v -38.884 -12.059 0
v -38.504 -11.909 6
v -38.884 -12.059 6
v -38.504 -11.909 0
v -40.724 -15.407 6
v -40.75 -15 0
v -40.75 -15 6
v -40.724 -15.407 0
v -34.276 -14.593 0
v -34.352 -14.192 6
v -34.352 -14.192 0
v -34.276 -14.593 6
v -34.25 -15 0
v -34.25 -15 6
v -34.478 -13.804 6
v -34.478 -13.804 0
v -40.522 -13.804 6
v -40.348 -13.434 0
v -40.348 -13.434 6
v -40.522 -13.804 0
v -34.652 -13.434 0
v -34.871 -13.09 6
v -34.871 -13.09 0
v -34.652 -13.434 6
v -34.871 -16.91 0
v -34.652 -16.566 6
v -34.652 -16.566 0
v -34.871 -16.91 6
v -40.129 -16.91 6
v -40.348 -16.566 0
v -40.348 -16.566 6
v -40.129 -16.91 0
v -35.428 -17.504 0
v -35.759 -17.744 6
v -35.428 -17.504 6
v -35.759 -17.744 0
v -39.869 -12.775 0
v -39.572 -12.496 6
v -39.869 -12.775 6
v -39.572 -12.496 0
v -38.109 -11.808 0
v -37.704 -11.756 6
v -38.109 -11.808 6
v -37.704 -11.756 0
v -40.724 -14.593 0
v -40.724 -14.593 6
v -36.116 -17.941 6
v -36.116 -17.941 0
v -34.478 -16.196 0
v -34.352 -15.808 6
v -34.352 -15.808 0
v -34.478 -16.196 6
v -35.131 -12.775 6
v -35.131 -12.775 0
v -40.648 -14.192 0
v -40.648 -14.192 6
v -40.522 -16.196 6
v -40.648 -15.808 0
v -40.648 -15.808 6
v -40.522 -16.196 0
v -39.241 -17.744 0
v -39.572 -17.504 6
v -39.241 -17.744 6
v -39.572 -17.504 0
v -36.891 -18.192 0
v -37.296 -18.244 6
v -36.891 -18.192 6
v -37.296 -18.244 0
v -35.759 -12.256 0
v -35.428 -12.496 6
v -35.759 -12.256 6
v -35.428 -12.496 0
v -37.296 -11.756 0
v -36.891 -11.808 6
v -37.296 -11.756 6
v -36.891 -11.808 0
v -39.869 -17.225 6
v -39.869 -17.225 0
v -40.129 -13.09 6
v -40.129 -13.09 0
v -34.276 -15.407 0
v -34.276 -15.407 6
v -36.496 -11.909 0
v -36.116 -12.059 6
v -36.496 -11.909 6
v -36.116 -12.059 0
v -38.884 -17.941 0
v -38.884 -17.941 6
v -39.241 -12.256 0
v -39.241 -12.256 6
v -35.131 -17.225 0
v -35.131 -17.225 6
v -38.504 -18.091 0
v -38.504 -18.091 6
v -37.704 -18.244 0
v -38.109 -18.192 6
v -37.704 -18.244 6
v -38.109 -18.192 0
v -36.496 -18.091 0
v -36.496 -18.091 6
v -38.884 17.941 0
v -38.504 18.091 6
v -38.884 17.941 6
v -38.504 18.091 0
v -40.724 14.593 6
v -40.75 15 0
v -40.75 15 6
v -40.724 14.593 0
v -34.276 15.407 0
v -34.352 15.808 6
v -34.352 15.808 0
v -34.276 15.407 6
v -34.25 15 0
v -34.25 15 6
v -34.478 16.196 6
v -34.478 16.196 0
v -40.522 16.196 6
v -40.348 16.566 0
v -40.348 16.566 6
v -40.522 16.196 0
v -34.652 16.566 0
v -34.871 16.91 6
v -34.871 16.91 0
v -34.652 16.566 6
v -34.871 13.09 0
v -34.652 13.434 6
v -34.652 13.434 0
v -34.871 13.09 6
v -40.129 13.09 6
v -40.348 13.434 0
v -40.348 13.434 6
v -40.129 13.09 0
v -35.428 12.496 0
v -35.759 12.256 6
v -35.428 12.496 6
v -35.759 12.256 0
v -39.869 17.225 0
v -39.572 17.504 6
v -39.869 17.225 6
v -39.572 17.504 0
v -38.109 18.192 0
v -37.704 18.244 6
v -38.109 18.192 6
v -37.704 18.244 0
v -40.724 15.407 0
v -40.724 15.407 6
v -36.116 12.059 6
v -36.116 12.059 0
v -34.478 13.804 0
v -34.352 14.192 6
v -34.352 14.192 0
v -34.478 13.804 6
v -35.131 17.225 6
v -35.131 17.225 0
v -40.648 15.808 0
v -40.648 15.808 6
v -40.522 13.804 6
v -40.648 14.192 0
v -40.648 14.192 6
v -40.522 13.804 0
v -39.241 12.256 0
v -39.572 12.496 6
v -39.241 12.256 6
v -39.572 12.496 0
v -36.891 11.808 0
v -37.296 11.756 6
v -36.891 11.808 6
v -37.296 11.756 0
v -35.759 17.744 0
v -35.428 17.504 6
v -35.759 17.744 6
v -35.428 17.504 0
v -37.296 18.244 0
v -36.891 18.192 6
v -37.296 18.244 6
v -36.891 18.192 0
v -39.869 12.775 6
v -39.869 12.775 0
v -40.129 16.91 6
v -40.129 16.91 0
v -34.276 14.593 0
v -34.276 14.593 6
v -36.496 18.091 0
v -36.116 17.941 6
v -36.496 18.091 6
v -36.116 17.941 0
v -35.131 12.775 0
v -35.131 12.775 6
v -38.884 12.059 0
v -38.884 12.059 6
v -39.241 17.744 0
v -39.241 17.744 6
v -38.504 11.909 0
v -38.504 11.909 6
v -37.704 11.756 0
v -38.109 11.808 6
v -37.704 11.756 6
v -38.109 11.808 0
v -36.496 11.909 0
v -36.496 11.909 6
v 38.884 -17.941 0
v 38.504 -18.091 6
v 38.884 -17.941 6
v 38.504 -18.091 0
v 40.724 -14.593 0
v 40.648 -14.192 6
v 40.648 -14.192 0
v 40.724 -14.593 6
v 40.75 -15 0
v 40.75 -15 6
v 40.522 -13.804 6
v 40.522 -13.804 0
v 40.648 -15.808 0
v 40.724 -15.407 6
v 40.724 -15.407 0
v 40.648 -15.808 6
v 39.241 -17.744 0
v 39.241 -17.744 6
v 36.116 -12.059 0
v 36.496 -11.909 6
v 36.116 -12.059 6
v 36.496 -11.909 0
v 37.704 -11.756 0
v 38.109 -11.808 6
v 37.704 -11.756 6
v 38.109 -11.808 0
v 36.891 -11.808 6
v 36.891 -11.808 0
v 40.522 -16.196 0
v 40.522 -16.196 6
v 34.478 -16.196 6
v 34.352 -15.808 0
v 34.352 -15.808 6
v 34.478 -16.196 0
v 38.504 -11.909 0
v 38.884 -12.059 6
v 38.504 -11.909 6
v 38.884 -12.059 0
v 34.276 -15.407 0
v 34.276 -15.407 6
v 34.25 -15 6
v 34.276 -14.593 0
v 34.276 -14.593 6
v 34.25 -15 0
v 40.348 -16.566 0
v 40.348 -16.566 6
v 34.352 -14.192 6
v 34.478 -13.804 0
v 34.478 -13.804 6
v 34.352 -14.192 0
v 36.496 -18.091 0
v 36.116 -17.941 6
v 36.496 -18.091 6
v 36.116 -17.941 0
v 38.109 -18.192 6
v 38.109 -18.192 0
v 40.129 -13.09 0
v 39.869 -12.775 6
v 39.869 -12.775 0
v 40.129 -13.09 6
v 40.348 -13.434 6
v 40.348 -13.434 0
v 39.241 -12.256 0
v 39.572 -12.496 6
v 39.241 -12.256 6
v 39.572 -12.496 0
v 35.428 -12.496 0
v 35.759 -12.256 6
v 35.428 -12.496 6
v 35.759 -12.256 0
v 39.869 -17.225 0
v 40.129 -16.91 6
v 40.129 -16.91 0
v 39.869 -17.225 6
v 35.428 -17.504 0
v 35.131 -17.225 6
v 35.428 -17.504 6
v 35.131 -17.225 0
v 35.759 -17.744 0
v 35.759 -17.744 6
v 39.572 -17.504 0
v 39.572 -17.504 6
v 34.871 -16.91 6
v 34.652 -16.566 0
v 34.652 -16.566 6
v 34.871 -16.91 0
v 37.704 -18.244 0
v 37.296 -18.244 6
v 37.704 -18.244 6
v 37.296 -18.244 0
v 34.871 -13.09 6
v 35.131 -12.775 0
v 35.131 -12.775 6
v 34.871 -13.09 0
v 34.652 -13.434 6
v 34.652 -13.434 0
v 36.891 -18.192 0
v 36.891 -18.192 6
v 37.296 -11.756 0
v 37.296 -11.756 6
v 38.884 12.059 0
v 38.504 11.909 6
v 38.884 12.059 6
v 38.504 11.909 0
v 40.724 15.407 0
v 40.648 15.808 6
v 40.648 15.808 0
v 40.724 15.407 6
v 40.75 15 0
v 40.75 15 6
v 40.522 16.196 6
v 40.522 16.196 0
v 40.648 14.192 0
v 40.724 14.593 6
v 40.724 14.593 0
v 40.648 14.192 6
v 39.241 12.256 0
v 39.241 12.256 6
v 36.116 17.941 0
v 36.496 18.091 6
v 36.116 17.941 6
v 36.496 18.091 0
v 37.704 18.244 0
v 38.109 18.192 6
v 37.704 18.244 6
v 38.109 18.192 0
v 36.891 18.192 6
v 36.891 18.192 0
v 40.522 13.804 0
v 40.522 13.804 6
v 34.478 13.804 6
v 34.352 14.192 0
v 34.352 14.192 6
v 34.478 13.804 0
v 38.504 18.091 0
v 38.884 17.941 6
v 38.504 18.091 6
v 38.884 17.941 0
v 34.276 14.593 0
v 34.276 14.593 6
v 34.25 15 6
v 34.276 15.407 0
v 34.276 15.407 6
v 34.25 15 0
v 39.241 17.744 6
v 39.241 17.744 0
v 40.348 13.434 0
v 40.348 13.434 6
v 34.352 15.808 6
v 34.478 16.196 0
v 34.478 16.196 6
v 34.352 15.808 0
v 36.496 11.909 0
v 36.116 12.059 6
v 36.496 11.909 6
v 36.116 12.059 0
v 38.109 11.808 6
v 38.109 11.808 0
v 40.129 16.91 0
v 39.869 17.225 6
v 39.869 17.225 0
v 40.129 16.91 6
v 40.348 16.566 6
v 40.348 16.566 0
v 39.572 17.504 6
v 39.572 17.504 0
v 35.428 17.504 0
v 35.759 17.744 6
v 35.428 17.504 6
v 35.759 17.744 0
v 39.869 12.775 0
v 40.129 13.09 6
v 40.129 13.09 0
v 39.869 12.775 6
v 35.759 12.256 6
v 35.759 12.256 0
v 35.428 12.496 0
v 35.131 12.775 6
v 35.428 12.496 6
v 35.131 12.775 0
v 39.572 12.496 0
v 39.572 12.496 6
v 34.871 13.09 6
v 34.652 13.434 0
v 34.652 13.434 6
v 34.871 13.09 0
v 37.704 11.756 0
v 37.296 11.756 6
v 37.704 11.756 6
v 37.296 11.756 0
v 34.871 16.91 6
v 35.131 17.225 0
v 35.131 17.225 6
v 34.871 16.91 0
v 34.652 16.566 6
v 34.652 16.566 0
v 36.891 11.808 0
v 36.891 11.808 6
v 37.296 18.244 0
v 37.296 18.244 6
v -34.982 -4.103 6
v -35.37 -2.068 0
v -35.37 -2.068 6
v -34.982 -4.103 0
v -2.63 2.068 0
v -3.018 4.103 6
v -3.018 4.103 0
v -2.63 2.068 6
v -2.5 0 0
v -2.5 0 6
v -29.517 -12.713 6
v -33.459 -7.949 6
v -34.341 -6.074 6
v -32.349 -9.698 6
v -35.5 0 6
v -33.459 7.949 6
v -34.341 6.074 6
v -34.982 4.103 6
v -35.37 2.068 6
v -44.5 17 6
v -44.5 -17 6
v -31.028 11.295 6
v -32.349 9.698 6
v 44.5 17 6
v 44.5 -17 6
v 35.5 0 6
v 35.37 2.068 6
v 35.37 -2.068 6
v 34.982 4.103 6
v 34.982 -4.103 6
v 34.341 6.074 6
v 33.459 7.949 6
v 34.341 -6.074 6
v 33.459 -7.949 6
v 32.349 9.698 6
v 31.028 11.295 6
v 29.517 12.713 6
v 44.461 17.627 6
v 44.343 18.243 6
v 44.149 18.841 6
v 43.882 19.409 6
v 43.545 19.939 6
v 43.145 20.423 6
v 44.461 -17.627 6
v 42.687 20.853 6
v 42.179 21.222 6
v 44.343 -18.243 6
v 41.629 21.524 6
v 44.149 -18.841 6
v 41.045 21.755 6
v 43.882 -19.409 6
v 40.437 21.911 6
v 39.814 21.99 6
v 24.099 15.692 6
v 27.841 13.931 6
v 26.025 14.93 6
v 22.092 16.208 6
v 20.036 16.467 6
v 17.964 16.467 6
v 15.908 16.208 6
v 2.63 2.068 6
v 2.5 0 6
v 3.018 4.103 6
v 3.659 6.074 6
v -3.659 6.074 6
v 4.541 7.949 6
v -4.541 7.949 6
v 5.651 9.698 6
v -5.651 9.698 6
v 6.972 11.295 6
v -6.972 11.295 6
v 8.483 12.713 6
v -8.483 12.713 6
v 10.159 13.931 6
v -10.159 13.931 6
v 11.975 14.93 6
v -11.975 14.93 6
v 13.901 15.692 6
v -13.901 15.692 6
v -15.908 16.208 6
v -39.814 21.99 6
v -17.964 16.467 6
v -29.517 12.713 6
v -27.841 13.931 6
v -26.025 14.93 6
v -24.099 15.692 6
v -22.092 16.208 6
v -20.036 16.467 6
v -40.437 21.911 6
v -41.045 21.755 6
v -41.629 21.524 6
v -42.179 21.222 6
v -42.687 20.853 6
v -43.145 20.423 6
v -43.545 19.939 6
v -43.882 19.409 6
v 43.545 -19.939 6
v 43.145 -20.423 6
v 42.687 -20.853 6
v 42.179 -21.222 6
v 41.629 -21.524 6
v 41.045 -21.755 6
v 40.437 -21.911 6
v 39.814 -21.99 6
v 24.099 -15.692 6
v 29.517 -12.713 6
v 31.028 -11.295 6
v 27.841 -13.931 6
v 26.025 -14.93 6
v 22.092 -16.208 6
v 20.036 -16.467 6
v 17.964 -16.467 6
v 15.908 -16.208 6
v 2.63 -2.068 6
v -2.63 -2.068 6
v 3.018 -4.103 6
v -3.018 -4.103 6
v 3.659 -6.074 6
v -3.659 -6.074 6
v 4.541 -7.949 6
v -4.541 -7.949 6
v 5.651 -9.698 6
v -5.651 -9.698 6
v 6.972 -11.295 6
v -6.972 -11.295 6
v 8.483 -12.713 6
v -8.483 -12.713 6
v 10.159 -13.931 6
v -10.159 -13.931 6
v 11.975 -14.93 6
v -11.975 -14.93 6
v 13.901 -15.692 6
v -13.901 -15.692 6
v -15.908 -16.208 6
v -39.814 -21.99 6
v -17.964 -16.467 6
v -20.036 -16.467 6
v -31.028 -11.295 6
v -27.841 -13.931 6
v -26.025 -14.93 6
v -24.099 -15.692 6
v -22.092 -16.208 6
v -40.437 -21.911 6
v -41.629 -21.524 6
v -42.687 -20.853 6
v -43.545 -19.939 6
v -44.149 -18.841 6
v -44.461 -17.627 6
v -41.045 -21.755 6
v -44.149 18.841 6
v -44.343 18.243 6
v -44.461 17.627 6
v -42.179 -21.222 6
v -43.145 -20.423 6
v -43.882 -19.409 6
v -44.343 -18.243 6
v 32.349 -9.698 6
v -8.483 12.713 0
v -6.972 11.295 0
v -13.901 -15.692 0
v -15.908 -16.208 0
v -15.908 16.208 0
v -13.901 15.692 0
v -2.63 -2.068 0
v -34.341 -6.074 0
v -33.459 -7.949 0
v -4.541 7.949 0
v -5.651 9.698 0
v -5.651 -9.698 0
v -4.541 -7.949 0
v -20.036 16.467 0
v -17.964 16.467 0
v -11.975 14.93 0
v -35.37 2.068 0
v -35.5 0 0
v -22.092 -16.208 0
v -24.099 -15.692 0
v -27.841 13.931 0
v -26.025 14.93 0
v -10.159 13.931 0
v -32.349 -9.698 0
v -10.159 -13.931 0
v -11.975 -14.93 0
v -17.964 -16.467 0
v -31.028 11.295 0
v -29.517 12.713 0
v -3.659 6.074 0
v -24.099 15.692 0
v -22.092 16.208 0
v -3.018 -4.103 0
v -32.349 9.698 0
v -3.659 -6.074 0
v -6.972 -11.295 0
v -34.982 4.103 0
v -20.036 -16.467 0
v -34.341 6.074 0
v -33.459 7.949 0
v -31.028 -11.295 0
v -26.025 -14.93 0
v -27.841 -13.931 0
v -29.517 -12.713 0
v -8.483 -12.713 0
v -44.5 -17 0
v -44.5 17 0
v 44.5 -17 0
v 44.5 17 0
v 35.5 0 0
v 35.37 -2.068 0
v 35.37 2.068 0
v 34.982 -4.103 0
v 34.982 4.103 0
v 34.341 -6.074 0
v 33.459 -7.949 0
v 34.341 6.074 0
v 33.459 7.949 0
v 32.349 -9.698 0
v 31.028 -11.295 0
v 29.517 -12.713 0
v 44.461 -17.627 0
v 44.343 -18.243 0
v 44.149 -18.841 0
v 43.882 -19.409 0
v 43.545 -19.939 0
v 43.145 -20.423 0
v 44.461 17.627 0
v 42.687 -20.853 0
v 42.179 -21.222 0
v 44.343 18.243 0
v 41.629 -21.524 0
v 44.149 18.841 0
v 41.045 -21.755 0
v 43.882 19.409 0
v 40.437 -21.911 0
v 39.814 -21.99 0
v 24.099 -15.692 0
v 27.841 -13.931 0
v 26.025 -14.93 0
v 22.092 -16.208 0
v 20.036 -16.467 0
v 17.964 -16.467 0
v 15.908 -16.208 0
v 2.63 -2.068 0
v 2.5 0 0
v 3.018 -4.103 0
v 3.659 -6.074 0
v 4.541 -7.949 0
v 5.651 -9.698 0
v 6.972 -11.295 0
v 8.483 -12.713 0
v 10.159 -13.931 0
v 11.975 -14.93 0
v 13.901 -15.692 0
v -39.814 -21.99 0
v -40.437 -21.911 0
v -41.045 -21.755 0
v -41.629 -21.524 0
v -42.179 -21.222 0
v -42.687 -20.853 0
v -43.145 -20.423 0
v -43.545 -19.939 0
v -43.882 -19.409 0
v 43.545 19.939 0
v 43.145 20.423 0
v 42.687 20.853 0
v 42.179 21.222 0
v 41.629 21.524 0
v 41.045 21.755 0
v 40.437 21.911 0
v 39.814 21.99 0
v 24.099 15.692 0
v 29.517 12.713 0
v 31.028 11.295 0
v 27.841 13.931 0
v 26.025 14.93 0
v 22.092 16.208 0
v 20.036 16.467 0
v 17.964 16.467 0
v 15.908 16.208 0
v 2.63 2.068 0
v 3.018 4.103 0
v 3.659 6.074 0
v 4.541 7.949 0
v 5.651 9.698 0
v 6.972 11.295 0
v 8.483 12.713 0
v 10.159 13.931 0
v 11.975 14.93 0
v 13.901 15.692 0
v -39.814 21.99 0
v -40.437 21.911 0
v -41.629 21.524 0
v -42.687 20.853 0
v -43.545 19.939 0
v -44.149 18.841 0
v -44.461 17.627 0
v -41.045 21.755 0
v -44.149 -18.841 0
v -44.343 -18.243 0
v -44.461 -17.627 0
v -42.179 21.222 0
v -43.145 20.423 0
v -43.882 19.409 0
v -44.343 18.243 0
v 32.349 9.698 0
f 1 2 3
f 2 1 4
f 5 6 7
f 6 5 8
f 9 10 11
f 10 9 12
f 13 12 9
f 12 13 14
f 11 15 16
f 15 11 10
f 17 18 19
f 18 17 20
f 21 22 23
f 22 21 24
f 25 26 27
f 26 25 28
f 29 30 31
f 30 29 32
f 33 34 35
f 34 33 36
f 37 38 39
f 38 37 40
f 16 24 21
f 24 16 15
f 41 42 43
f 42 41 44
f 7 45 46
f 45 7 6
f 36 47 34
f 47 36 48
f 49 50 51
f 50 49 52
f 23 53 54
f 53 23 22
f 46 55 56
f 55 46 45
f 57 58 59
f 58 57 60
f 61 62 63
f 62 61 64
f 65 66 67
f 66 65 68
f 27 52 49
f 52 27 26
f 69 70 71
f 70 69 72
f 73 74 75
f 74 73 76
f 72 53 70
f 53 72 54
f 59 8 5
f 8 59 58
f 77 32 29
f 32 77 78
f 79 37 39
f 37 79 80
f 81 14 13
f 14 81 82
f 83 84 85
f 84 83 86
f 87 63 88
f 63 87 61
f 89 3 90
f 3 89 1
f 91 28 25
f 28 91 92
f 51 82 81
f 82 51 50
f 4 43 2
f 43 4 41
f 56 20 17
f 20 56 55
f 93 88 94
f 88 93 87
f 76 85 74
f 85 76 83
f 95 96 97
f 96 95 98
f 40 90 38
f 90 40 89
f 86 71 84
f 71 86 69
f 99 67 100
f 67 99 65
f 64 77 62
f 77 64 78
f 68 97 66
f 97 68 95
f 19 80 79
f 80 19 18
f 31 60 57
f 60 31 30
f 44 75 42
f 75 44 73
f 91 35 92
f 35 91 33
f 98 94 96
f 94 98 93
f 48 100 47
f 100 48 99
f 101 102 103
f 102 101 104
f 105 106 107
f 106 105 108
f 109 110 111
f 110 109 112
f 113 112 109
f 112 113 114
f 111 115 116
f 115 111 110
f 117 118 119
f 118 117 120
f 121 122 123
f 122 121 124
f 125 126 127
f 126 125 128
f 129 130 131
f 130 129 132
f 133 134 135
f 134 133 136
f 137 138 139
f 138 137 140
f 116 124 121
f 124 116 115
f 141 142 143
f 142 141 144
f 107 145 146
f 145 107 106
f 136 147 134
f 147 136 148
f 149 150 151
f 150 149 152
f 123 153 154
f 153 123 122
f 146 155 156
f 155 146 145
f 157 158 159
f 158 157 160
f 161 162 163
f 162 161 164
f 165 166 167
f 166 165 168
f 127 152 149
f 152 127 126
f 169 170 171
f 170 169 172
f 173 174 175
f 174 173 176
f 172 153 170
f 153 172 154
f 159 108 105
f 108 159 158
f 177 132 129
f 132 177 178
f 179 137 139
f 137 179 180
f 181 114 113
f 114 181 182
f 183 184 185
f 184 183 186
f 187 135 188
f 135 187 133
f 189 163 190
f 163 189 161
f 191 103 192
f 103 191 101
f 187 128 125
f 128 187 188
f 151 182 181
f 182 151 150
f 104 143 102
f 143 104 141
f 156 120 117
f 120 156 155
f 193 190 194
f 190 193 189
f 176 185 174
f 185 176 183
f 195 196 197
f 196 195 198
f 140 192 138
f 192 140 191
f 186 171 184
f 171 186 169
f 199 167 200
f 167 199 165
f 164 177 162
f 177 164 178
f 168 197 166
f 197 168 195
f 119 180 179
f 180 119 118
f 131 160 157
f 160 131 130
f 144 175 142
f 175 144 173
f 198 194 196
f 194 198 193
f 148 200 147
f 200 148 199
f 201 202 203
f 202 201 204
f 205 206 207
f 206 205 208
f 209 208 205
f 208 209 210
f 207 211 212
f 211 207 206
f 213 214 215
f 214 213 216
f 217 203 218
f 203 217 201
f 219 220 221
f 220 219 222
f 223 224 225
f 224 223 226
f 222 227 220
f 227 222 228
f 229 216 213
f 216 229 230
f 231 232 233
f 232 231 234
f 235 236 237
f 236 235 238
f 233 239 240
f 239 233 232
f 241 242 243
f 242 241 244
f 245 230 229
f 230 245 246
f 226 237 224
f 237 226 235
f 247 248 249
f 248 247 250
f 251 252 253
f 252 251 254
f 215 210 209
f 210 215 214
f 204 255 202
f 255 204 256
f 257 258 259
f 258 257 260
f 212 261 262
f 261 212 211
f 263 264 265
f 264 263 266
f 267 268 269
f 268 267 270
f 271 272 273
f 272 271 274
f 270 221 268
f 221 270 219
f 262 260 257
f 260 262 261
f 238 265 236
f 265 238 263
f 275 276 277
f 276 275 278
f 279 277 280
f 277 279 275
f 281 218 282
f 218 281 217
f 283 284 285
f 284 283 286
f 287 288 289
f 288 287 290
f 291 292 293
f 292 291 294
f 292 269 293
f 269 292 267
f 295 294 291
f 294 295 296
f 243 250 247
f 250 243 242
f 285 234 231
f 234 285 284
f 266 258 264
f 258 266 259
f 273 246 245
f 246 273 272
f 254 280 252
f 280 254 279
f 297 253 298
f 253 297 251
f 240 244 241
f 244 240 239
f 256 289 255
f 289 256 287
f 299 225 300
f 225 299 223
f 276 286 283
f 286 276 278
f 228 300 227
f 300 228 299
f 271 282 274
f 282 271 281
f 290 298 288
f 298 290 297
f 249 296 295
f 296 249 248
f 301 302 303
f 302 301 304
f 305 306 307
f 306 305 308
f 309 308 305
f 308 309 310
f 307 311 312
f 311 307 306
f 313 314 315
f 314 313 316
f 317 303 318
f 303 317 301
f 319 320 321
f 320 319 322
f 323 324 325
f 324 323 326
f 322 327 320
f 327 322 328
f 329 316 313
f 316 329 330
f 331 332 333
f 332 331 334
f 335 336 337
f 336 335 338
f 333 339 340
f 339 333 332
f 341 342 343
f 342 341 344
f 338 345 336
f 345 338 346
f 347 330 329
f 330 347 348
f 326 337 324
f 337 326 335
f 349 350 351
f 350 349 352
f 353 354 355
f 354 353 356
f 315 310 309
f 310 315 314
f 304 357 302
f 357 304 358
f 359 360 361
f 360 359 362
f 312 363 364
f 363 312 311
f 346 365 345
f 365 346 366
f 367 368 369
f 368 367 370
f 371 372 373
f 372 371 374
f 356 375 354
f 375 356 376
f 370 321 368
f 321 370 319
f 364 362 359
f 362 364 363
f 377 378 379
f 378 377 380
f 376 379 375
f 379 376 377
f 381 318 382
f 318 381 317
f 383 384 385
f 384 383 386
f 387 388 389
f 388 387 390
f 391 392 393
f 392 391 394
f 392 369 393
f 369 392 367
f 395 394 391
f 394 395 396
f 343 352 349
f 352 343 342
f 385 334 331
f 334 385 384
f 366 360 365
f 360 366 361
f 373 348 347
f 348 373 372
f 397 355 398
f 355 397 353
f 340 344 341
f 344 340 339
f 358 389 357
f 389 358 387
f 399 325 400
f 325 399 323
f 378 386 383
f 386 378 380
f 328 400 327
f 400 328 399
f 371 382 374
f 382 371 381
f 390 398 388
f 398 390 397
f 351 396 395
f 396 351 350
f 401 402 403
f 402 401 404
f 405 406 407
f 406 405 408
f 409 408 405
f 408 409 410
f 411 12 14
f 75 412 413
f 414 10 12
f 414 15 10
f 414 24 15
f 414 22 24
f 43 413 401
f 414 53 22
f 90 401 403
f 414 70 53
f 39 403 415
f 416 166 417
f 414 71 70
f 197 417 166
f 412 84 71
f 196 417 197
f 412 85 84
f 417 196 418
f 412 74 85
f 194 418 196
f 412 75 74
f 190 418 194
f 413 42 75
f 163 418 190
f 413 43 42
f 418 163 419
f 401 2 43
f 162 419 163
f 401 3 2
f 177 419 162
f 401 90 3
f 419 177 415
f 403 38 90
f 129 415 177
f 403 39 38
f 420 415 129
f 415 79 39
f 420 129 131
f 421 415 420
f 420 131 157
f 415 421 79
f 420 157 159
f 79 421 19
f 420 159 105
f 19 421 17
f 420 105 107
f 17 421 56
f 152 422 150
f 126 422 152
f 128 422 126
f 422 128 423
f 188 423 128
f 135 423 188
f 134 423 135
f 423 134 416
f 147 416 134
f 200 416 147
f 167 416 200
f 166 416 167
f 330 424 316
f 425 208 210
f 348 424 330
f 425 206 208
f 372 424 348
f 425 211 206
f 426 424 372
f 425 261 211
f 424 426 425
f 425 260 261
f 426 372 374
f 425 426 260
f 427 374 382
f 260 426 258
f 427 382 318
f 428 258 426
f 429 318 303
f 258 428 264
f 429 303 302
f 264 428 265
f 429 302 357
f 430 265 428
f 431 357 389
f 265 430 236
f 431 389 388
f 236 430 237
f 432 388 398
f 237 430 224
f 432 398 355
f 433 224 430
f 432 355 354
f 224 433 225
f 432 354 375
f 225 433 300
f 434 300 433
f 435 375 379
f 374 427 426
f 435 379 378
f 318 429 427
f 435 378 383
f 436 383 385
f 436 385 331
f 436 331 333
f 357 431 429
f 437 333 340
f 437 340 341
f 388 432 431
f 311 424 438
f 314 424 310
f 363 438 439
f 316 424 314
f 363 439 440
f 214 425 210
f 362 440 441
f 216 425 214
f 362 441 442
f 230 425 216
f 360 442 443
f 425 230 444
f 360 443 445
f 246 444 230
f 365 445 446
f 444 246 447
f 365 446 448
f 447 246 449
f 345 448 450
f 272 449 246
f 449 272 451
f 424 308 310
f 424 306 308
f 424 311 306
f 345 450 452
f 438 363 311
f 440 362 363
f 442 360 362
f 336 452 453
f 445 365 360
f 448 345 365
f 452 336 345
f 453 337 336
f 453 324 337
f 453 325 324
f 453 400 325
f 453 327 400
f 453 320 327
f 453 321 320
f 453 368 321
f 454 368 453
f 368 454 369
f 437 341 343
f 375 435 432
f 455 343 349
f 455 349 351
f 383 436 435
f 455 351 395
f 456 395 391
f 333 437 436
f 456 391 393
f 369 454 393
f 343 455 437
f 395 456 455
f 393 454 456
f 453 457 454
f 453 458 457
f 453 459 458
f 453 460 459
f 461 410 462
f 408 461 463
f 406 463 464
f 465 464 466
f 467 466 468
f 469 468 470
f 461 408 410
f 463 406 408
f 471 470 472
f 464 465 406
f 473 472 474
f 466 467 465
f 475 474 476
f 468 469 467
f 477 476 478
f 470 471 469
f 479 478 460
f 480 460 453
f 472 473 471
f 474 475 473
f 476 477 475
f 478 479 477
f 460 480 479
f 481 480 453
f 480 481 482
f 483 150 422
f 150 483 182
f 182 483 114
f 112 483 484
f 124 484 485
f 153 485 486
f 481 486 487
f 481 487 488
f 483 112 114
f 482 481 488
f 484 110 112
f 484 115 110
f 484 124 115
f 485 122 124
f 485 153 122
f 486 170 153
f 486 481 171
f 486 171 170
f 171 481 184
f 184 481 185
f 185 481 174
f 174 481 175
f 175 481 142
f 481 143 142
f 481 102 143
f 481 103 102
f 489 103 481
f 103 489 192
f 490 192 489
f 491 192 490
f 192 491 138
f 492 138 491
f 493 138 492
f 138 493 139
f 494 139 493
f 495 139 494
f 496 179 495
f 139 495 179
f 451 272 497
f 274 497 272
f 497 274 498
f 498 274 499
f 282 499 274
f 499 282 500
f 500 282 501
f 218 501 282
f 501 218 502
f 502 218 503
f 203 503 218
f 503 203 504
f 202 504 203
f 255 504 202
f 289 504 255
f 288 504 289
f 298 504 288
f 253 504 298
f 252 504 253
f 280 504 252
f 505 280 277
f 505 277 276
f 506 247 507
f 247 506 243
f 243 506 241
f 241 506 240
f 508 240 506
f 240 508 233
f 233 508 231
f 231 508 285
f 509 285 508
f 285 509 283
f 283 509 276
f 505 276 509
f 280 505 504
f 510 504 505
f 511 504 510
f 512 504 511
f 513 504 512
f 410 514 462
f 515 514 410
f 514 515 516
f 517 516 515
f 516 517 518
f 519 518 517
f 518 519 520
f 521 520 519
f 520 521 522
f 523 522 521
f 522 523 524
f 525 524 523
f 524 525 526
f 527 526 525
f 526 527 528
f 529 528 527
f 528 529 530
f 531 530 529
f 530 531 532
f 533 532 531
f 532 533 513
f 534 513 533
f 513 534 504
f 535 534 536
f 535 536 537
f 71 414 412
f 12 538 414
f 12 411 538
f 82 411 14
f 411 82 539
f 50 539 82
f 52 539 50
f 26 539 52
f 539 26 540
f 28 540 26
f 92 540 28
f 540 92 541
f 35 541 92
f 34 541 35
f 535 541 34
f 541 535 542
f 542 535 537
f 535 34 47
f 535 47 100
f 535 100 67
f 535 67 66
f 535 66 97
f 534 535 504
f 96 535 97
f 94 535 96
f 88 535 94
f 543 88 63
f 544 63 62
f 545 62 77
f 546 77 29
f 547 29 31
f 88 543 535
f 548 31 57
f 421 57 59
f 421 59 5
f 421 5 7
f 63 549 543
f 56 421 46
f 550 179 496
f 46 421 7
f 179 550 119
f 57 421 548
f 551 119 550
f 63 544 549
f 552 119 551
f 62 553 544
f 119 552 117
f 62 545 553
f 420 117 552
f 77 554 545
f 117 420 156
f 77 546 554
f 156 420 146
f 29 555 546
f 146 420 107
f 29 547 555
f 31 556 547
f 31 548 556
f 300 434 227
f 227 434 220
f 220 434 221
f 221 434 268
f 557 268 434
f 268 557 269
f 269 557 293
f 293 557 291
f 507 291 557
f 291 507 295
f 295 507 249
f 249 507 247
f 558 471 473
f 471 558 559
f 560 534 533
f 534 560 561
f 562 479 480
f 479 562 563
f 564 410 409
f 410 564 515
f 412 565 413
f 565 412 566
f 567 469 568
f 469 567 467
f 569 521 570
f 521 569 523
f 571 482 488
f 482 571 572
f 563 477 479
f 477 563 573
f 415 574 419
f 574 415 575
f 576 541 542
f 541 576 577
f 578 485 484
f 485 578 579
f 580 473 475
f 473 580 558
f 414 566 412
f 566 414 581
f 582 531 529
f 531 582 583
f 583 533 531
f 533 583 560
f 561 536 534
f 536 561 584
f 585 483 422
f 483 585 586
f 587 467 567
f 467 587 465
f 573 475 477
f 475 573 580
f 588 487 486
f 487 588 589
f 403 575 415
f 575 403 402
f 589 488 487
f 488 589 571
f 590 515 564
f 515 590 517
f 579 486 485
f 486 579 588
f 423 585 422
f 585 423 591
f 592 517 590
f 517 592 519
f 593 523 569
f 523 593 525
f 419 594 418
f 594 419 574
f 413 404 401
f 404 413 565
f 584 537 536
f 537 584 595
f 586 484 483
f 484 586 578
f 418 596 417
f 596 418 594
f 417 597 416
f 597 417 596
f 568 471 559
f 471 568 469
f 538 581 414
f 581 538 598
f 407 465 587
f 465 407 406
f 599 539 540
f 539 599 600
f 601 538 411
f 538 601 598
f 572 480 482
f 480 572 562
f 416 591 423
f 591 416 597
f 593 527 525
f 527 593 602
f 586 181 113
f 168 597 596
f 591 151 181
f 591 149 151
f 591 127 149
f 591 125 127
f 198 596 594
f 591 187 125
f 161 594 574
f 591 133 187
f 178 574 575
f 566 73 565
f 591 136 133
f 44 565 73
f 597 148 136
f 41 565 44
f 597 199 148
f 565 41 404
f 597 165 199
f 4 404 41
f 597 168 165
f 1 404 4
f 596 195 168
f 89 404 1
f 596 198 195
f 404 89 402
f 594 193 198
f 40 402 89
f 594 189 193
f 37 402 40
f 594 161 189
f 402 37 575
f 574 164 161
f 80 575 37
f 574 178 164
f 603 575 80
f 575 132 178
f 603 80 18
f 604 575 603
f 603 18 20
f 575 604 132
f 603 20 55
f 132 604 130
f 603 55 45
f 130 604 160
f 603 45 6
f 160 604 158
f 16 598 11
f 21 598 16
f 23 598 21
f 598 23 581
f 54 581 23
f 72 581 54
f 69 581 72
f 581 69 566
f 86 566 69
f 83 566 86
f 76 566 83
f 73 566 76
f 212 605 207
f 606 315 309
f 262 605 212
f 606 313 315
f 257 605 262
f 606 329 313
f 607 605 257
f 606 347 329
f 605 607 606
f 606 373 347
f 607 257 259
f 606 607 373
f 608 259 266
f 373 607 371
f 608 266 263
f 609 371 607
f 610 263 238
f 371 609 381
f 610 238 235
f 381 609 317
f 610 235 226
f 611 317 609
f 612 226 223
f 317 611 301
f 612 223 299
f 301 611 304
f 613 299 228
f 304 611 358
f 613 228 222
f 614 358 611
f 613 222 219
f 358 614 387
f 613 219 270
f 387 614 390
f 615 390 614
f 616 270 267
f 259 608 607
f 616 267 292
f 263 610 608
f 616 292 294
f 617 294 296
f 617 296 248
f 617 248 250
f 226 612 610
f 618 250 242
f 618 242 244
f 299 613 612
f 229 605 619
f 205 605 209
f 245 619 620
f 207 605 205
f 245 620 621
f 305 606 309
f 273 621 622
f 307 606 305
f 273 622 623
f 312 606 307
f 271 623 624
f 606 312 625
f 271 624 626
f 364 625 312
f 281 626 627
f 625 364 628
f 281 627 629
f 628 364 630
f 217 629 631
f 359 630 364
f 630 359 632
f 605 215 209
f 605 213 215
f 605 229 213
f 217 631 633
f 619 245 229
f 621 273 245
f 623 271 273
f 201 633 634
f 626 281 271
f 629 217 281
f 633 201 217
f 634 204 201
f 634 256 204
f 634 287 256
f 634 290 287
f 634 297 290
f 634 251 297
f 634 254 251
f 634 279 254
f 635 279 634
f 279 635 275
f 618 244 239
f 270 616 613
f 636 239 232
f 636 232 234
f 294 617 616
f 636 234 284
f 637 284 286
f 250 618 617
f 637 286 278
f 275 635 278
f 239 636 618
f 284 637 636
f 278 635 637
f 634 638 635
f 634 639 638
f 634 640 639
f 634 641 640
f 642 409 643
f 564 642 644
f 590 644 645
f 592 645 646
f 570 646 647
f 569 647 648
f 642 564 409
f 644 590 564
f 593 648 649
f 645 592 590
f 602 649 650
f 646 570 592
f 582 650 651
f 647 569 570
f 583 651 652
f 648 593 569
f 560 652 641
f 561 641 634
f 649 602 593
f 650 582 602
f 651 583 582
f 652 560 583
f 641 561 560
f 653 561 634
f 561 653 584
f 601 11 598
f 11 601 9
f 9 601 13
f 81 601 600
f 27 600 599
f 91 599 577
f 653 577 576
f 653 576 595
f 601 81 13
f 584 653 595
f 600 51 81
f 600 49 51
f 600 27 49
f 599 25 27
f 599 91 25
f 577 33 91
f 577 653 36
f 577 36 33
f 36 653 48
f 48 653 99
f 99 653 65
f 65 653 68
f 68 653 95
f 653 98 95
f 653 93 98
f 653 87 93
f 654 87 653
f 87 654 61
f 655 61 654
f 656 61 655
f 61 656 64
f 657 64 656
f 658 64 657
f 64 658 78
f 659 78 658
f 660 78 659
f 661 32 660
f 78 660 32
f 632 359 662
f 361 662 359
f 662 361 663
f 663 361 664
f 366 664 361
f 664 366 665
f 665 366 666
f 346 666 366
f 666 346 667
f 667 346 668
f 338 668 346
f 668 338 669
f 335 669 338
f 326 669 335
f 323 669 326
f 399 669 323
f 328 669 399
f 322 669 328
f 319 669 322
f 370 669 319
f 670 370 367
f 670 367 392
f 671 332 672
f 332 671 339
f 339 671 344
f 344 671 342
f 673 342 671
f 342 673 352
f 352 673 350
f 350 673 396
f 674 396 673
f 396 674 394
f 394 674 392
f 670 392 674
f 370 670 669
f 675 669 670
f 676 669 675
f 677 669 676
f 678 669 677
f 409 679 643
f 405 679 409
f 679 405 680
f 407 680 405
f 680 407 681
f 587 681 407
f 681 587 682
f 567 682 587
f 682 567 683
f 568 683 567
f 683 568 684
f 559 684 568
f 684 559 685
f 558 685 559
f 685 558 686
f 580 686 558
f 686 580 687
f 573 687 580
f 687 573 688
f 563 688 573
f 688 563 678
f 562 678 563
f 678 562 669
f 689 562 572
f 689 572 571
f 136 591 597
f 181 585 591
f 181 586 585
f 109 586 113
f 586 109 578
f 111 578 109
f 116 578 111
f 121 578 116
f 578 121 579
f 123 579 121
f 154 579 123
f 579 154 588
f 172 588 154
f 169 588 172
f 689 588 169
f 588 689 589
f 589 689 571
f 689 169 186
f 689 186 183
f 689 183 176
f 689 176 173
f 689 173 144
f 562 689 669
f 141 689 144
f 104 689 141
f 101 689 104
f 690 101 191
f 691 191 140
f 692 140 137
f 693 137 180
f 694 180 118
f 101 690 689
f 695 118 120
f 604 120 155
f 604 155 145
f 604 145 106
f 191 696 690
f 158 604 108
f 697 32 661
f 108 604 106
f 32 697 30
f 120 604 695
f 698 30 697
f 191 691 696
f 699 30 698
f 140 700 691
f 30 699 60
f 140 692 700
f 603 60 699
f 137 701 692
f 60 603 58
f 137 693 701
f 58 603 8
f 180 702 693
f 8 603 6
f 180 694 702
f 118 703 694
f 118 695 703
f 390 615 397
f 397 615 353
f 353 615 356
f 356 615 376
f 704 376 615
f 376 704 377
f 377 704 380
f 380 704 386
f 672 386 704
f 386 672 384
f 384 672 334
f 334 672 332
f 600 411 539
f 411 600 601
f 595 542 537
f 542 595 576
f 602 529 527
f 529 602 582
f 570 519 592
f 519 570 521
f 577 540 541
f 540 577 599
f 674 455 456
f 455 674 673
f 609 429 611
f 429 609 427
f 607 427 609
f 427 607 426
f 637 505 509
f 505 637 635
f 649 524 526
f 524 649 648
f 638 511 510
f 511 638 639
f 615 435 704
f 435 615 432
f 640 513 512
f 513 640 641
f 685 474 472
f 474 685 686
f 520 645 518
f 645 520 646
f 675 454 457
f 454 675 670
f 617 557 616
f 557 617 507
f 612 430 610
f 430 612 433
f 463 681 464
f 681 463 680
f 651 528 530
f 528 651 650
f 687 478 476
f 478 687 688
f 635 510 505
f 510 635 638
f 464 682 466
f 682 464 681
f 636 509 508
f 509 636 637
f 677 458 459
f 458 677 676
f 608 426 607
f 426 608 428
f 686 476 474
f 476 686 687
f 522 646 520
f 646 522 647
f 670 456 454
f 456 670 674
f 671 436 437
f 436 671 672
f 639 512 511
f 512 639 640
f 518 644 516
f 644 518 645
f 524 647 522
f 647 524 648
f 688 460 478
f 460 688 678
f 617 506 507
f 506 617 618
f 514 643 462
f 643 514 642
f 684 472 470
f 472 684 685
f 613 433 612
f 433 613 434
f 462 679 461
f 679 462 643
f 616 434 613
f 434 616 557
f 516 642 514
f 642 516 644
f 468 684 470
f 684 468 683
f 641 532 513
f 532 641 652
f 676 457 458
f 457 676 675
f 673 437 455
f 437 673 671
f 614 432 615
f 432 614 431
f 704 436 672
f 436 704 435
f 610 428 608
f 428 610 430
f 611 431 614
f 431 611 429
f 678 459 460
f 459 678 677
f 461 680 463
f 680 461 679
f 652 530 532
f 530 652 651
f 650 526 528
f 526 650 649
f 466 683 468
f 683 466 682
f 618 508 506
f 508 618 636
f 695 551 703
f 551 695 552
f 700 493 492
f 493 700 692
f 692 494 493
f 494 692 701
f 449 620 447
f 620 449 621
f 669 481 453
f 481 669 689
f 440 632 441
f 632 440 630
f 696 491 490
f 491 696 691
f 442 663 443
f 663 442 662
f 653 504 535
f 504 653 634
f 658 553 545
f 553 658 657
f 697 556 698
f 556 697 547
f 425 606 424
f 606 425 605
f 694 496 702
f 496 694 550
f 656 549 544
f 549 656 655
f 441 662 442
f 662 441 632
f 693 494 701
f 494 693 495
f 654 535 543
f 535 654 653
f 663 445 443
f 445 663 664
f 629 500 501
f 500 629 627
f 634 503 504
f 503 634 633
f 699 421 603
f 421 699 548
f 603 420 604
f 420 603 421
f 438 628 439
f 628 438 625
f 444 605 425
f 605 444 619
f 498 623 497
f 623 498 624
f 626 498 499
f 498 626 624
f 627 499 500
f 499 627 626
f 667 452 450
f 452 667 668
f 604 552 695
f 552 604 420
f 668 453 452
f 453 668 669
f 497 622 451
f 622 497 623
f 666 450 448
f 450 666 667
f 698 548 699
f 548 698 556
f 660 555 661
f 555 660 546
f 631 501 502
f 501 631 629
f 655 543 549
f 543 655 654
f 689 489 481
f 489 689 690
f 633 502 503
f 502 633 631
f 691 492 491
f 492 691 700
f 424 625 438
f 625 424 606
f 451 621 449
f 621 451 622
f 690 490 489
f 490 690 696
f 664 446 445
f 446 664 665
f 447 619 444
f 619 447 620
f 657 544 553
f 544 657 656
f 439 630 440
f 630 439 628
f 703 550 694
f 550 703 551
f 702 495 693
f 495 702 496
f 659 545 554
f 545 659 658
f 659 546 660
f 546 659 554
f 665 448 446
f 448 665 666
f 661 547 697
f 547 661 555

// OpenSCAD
$fn = 50;


difference() {
	union() {
		hull() {
			translate(v = [-39.5000000000, 17.0000000000, 0]) {
				cylinder(h = 6, r = 5);
			}
			translate(v = [39.5000000000, 17.0000000000, 0]) {
				cylinder(h = 6, r = 5);
			}
			translate(v = [-39.5000000000, -17.0000000000, 0]) {
				cylinder(h = 6, r = 5);
			}
			translate(v = [39.5000000000, -17.0000000000, 0]) {
				cylinder(h = 6, r = 5);
			}
		}
	}
	union() {
		#translate(v = [-37.5000000000, -15.0000000000, -100.0000000000]) {
			cylinder(h = 200, r = 3.2500000000);
		}
		#translate(v = [-37.5000000000, 15.0000000000, -100.0000000000]) {
			cylinder(h = 200, r = 3.2500000000);
		}
		#translate(v = [37.5000000000, -15.0000000000, -100.0000000000]) {
			cylinder(h = 200, r = 3.2500000000);
		}
		#translate(v = [37.5000000000, 15.0000000000, -100.0000000000]) {
			cylinder(h = 200, r = 3.2500000000);
		}
		#translate(v = [-19.0000000000, 0, 0]) {
			cylinder(h = 6, r = 16.5000000000);
		}
		#translate(v = [19.0000000000, 0, 0]) {
			cylinder(h = 6, r = 16.5000000000);
		}
	}
}
